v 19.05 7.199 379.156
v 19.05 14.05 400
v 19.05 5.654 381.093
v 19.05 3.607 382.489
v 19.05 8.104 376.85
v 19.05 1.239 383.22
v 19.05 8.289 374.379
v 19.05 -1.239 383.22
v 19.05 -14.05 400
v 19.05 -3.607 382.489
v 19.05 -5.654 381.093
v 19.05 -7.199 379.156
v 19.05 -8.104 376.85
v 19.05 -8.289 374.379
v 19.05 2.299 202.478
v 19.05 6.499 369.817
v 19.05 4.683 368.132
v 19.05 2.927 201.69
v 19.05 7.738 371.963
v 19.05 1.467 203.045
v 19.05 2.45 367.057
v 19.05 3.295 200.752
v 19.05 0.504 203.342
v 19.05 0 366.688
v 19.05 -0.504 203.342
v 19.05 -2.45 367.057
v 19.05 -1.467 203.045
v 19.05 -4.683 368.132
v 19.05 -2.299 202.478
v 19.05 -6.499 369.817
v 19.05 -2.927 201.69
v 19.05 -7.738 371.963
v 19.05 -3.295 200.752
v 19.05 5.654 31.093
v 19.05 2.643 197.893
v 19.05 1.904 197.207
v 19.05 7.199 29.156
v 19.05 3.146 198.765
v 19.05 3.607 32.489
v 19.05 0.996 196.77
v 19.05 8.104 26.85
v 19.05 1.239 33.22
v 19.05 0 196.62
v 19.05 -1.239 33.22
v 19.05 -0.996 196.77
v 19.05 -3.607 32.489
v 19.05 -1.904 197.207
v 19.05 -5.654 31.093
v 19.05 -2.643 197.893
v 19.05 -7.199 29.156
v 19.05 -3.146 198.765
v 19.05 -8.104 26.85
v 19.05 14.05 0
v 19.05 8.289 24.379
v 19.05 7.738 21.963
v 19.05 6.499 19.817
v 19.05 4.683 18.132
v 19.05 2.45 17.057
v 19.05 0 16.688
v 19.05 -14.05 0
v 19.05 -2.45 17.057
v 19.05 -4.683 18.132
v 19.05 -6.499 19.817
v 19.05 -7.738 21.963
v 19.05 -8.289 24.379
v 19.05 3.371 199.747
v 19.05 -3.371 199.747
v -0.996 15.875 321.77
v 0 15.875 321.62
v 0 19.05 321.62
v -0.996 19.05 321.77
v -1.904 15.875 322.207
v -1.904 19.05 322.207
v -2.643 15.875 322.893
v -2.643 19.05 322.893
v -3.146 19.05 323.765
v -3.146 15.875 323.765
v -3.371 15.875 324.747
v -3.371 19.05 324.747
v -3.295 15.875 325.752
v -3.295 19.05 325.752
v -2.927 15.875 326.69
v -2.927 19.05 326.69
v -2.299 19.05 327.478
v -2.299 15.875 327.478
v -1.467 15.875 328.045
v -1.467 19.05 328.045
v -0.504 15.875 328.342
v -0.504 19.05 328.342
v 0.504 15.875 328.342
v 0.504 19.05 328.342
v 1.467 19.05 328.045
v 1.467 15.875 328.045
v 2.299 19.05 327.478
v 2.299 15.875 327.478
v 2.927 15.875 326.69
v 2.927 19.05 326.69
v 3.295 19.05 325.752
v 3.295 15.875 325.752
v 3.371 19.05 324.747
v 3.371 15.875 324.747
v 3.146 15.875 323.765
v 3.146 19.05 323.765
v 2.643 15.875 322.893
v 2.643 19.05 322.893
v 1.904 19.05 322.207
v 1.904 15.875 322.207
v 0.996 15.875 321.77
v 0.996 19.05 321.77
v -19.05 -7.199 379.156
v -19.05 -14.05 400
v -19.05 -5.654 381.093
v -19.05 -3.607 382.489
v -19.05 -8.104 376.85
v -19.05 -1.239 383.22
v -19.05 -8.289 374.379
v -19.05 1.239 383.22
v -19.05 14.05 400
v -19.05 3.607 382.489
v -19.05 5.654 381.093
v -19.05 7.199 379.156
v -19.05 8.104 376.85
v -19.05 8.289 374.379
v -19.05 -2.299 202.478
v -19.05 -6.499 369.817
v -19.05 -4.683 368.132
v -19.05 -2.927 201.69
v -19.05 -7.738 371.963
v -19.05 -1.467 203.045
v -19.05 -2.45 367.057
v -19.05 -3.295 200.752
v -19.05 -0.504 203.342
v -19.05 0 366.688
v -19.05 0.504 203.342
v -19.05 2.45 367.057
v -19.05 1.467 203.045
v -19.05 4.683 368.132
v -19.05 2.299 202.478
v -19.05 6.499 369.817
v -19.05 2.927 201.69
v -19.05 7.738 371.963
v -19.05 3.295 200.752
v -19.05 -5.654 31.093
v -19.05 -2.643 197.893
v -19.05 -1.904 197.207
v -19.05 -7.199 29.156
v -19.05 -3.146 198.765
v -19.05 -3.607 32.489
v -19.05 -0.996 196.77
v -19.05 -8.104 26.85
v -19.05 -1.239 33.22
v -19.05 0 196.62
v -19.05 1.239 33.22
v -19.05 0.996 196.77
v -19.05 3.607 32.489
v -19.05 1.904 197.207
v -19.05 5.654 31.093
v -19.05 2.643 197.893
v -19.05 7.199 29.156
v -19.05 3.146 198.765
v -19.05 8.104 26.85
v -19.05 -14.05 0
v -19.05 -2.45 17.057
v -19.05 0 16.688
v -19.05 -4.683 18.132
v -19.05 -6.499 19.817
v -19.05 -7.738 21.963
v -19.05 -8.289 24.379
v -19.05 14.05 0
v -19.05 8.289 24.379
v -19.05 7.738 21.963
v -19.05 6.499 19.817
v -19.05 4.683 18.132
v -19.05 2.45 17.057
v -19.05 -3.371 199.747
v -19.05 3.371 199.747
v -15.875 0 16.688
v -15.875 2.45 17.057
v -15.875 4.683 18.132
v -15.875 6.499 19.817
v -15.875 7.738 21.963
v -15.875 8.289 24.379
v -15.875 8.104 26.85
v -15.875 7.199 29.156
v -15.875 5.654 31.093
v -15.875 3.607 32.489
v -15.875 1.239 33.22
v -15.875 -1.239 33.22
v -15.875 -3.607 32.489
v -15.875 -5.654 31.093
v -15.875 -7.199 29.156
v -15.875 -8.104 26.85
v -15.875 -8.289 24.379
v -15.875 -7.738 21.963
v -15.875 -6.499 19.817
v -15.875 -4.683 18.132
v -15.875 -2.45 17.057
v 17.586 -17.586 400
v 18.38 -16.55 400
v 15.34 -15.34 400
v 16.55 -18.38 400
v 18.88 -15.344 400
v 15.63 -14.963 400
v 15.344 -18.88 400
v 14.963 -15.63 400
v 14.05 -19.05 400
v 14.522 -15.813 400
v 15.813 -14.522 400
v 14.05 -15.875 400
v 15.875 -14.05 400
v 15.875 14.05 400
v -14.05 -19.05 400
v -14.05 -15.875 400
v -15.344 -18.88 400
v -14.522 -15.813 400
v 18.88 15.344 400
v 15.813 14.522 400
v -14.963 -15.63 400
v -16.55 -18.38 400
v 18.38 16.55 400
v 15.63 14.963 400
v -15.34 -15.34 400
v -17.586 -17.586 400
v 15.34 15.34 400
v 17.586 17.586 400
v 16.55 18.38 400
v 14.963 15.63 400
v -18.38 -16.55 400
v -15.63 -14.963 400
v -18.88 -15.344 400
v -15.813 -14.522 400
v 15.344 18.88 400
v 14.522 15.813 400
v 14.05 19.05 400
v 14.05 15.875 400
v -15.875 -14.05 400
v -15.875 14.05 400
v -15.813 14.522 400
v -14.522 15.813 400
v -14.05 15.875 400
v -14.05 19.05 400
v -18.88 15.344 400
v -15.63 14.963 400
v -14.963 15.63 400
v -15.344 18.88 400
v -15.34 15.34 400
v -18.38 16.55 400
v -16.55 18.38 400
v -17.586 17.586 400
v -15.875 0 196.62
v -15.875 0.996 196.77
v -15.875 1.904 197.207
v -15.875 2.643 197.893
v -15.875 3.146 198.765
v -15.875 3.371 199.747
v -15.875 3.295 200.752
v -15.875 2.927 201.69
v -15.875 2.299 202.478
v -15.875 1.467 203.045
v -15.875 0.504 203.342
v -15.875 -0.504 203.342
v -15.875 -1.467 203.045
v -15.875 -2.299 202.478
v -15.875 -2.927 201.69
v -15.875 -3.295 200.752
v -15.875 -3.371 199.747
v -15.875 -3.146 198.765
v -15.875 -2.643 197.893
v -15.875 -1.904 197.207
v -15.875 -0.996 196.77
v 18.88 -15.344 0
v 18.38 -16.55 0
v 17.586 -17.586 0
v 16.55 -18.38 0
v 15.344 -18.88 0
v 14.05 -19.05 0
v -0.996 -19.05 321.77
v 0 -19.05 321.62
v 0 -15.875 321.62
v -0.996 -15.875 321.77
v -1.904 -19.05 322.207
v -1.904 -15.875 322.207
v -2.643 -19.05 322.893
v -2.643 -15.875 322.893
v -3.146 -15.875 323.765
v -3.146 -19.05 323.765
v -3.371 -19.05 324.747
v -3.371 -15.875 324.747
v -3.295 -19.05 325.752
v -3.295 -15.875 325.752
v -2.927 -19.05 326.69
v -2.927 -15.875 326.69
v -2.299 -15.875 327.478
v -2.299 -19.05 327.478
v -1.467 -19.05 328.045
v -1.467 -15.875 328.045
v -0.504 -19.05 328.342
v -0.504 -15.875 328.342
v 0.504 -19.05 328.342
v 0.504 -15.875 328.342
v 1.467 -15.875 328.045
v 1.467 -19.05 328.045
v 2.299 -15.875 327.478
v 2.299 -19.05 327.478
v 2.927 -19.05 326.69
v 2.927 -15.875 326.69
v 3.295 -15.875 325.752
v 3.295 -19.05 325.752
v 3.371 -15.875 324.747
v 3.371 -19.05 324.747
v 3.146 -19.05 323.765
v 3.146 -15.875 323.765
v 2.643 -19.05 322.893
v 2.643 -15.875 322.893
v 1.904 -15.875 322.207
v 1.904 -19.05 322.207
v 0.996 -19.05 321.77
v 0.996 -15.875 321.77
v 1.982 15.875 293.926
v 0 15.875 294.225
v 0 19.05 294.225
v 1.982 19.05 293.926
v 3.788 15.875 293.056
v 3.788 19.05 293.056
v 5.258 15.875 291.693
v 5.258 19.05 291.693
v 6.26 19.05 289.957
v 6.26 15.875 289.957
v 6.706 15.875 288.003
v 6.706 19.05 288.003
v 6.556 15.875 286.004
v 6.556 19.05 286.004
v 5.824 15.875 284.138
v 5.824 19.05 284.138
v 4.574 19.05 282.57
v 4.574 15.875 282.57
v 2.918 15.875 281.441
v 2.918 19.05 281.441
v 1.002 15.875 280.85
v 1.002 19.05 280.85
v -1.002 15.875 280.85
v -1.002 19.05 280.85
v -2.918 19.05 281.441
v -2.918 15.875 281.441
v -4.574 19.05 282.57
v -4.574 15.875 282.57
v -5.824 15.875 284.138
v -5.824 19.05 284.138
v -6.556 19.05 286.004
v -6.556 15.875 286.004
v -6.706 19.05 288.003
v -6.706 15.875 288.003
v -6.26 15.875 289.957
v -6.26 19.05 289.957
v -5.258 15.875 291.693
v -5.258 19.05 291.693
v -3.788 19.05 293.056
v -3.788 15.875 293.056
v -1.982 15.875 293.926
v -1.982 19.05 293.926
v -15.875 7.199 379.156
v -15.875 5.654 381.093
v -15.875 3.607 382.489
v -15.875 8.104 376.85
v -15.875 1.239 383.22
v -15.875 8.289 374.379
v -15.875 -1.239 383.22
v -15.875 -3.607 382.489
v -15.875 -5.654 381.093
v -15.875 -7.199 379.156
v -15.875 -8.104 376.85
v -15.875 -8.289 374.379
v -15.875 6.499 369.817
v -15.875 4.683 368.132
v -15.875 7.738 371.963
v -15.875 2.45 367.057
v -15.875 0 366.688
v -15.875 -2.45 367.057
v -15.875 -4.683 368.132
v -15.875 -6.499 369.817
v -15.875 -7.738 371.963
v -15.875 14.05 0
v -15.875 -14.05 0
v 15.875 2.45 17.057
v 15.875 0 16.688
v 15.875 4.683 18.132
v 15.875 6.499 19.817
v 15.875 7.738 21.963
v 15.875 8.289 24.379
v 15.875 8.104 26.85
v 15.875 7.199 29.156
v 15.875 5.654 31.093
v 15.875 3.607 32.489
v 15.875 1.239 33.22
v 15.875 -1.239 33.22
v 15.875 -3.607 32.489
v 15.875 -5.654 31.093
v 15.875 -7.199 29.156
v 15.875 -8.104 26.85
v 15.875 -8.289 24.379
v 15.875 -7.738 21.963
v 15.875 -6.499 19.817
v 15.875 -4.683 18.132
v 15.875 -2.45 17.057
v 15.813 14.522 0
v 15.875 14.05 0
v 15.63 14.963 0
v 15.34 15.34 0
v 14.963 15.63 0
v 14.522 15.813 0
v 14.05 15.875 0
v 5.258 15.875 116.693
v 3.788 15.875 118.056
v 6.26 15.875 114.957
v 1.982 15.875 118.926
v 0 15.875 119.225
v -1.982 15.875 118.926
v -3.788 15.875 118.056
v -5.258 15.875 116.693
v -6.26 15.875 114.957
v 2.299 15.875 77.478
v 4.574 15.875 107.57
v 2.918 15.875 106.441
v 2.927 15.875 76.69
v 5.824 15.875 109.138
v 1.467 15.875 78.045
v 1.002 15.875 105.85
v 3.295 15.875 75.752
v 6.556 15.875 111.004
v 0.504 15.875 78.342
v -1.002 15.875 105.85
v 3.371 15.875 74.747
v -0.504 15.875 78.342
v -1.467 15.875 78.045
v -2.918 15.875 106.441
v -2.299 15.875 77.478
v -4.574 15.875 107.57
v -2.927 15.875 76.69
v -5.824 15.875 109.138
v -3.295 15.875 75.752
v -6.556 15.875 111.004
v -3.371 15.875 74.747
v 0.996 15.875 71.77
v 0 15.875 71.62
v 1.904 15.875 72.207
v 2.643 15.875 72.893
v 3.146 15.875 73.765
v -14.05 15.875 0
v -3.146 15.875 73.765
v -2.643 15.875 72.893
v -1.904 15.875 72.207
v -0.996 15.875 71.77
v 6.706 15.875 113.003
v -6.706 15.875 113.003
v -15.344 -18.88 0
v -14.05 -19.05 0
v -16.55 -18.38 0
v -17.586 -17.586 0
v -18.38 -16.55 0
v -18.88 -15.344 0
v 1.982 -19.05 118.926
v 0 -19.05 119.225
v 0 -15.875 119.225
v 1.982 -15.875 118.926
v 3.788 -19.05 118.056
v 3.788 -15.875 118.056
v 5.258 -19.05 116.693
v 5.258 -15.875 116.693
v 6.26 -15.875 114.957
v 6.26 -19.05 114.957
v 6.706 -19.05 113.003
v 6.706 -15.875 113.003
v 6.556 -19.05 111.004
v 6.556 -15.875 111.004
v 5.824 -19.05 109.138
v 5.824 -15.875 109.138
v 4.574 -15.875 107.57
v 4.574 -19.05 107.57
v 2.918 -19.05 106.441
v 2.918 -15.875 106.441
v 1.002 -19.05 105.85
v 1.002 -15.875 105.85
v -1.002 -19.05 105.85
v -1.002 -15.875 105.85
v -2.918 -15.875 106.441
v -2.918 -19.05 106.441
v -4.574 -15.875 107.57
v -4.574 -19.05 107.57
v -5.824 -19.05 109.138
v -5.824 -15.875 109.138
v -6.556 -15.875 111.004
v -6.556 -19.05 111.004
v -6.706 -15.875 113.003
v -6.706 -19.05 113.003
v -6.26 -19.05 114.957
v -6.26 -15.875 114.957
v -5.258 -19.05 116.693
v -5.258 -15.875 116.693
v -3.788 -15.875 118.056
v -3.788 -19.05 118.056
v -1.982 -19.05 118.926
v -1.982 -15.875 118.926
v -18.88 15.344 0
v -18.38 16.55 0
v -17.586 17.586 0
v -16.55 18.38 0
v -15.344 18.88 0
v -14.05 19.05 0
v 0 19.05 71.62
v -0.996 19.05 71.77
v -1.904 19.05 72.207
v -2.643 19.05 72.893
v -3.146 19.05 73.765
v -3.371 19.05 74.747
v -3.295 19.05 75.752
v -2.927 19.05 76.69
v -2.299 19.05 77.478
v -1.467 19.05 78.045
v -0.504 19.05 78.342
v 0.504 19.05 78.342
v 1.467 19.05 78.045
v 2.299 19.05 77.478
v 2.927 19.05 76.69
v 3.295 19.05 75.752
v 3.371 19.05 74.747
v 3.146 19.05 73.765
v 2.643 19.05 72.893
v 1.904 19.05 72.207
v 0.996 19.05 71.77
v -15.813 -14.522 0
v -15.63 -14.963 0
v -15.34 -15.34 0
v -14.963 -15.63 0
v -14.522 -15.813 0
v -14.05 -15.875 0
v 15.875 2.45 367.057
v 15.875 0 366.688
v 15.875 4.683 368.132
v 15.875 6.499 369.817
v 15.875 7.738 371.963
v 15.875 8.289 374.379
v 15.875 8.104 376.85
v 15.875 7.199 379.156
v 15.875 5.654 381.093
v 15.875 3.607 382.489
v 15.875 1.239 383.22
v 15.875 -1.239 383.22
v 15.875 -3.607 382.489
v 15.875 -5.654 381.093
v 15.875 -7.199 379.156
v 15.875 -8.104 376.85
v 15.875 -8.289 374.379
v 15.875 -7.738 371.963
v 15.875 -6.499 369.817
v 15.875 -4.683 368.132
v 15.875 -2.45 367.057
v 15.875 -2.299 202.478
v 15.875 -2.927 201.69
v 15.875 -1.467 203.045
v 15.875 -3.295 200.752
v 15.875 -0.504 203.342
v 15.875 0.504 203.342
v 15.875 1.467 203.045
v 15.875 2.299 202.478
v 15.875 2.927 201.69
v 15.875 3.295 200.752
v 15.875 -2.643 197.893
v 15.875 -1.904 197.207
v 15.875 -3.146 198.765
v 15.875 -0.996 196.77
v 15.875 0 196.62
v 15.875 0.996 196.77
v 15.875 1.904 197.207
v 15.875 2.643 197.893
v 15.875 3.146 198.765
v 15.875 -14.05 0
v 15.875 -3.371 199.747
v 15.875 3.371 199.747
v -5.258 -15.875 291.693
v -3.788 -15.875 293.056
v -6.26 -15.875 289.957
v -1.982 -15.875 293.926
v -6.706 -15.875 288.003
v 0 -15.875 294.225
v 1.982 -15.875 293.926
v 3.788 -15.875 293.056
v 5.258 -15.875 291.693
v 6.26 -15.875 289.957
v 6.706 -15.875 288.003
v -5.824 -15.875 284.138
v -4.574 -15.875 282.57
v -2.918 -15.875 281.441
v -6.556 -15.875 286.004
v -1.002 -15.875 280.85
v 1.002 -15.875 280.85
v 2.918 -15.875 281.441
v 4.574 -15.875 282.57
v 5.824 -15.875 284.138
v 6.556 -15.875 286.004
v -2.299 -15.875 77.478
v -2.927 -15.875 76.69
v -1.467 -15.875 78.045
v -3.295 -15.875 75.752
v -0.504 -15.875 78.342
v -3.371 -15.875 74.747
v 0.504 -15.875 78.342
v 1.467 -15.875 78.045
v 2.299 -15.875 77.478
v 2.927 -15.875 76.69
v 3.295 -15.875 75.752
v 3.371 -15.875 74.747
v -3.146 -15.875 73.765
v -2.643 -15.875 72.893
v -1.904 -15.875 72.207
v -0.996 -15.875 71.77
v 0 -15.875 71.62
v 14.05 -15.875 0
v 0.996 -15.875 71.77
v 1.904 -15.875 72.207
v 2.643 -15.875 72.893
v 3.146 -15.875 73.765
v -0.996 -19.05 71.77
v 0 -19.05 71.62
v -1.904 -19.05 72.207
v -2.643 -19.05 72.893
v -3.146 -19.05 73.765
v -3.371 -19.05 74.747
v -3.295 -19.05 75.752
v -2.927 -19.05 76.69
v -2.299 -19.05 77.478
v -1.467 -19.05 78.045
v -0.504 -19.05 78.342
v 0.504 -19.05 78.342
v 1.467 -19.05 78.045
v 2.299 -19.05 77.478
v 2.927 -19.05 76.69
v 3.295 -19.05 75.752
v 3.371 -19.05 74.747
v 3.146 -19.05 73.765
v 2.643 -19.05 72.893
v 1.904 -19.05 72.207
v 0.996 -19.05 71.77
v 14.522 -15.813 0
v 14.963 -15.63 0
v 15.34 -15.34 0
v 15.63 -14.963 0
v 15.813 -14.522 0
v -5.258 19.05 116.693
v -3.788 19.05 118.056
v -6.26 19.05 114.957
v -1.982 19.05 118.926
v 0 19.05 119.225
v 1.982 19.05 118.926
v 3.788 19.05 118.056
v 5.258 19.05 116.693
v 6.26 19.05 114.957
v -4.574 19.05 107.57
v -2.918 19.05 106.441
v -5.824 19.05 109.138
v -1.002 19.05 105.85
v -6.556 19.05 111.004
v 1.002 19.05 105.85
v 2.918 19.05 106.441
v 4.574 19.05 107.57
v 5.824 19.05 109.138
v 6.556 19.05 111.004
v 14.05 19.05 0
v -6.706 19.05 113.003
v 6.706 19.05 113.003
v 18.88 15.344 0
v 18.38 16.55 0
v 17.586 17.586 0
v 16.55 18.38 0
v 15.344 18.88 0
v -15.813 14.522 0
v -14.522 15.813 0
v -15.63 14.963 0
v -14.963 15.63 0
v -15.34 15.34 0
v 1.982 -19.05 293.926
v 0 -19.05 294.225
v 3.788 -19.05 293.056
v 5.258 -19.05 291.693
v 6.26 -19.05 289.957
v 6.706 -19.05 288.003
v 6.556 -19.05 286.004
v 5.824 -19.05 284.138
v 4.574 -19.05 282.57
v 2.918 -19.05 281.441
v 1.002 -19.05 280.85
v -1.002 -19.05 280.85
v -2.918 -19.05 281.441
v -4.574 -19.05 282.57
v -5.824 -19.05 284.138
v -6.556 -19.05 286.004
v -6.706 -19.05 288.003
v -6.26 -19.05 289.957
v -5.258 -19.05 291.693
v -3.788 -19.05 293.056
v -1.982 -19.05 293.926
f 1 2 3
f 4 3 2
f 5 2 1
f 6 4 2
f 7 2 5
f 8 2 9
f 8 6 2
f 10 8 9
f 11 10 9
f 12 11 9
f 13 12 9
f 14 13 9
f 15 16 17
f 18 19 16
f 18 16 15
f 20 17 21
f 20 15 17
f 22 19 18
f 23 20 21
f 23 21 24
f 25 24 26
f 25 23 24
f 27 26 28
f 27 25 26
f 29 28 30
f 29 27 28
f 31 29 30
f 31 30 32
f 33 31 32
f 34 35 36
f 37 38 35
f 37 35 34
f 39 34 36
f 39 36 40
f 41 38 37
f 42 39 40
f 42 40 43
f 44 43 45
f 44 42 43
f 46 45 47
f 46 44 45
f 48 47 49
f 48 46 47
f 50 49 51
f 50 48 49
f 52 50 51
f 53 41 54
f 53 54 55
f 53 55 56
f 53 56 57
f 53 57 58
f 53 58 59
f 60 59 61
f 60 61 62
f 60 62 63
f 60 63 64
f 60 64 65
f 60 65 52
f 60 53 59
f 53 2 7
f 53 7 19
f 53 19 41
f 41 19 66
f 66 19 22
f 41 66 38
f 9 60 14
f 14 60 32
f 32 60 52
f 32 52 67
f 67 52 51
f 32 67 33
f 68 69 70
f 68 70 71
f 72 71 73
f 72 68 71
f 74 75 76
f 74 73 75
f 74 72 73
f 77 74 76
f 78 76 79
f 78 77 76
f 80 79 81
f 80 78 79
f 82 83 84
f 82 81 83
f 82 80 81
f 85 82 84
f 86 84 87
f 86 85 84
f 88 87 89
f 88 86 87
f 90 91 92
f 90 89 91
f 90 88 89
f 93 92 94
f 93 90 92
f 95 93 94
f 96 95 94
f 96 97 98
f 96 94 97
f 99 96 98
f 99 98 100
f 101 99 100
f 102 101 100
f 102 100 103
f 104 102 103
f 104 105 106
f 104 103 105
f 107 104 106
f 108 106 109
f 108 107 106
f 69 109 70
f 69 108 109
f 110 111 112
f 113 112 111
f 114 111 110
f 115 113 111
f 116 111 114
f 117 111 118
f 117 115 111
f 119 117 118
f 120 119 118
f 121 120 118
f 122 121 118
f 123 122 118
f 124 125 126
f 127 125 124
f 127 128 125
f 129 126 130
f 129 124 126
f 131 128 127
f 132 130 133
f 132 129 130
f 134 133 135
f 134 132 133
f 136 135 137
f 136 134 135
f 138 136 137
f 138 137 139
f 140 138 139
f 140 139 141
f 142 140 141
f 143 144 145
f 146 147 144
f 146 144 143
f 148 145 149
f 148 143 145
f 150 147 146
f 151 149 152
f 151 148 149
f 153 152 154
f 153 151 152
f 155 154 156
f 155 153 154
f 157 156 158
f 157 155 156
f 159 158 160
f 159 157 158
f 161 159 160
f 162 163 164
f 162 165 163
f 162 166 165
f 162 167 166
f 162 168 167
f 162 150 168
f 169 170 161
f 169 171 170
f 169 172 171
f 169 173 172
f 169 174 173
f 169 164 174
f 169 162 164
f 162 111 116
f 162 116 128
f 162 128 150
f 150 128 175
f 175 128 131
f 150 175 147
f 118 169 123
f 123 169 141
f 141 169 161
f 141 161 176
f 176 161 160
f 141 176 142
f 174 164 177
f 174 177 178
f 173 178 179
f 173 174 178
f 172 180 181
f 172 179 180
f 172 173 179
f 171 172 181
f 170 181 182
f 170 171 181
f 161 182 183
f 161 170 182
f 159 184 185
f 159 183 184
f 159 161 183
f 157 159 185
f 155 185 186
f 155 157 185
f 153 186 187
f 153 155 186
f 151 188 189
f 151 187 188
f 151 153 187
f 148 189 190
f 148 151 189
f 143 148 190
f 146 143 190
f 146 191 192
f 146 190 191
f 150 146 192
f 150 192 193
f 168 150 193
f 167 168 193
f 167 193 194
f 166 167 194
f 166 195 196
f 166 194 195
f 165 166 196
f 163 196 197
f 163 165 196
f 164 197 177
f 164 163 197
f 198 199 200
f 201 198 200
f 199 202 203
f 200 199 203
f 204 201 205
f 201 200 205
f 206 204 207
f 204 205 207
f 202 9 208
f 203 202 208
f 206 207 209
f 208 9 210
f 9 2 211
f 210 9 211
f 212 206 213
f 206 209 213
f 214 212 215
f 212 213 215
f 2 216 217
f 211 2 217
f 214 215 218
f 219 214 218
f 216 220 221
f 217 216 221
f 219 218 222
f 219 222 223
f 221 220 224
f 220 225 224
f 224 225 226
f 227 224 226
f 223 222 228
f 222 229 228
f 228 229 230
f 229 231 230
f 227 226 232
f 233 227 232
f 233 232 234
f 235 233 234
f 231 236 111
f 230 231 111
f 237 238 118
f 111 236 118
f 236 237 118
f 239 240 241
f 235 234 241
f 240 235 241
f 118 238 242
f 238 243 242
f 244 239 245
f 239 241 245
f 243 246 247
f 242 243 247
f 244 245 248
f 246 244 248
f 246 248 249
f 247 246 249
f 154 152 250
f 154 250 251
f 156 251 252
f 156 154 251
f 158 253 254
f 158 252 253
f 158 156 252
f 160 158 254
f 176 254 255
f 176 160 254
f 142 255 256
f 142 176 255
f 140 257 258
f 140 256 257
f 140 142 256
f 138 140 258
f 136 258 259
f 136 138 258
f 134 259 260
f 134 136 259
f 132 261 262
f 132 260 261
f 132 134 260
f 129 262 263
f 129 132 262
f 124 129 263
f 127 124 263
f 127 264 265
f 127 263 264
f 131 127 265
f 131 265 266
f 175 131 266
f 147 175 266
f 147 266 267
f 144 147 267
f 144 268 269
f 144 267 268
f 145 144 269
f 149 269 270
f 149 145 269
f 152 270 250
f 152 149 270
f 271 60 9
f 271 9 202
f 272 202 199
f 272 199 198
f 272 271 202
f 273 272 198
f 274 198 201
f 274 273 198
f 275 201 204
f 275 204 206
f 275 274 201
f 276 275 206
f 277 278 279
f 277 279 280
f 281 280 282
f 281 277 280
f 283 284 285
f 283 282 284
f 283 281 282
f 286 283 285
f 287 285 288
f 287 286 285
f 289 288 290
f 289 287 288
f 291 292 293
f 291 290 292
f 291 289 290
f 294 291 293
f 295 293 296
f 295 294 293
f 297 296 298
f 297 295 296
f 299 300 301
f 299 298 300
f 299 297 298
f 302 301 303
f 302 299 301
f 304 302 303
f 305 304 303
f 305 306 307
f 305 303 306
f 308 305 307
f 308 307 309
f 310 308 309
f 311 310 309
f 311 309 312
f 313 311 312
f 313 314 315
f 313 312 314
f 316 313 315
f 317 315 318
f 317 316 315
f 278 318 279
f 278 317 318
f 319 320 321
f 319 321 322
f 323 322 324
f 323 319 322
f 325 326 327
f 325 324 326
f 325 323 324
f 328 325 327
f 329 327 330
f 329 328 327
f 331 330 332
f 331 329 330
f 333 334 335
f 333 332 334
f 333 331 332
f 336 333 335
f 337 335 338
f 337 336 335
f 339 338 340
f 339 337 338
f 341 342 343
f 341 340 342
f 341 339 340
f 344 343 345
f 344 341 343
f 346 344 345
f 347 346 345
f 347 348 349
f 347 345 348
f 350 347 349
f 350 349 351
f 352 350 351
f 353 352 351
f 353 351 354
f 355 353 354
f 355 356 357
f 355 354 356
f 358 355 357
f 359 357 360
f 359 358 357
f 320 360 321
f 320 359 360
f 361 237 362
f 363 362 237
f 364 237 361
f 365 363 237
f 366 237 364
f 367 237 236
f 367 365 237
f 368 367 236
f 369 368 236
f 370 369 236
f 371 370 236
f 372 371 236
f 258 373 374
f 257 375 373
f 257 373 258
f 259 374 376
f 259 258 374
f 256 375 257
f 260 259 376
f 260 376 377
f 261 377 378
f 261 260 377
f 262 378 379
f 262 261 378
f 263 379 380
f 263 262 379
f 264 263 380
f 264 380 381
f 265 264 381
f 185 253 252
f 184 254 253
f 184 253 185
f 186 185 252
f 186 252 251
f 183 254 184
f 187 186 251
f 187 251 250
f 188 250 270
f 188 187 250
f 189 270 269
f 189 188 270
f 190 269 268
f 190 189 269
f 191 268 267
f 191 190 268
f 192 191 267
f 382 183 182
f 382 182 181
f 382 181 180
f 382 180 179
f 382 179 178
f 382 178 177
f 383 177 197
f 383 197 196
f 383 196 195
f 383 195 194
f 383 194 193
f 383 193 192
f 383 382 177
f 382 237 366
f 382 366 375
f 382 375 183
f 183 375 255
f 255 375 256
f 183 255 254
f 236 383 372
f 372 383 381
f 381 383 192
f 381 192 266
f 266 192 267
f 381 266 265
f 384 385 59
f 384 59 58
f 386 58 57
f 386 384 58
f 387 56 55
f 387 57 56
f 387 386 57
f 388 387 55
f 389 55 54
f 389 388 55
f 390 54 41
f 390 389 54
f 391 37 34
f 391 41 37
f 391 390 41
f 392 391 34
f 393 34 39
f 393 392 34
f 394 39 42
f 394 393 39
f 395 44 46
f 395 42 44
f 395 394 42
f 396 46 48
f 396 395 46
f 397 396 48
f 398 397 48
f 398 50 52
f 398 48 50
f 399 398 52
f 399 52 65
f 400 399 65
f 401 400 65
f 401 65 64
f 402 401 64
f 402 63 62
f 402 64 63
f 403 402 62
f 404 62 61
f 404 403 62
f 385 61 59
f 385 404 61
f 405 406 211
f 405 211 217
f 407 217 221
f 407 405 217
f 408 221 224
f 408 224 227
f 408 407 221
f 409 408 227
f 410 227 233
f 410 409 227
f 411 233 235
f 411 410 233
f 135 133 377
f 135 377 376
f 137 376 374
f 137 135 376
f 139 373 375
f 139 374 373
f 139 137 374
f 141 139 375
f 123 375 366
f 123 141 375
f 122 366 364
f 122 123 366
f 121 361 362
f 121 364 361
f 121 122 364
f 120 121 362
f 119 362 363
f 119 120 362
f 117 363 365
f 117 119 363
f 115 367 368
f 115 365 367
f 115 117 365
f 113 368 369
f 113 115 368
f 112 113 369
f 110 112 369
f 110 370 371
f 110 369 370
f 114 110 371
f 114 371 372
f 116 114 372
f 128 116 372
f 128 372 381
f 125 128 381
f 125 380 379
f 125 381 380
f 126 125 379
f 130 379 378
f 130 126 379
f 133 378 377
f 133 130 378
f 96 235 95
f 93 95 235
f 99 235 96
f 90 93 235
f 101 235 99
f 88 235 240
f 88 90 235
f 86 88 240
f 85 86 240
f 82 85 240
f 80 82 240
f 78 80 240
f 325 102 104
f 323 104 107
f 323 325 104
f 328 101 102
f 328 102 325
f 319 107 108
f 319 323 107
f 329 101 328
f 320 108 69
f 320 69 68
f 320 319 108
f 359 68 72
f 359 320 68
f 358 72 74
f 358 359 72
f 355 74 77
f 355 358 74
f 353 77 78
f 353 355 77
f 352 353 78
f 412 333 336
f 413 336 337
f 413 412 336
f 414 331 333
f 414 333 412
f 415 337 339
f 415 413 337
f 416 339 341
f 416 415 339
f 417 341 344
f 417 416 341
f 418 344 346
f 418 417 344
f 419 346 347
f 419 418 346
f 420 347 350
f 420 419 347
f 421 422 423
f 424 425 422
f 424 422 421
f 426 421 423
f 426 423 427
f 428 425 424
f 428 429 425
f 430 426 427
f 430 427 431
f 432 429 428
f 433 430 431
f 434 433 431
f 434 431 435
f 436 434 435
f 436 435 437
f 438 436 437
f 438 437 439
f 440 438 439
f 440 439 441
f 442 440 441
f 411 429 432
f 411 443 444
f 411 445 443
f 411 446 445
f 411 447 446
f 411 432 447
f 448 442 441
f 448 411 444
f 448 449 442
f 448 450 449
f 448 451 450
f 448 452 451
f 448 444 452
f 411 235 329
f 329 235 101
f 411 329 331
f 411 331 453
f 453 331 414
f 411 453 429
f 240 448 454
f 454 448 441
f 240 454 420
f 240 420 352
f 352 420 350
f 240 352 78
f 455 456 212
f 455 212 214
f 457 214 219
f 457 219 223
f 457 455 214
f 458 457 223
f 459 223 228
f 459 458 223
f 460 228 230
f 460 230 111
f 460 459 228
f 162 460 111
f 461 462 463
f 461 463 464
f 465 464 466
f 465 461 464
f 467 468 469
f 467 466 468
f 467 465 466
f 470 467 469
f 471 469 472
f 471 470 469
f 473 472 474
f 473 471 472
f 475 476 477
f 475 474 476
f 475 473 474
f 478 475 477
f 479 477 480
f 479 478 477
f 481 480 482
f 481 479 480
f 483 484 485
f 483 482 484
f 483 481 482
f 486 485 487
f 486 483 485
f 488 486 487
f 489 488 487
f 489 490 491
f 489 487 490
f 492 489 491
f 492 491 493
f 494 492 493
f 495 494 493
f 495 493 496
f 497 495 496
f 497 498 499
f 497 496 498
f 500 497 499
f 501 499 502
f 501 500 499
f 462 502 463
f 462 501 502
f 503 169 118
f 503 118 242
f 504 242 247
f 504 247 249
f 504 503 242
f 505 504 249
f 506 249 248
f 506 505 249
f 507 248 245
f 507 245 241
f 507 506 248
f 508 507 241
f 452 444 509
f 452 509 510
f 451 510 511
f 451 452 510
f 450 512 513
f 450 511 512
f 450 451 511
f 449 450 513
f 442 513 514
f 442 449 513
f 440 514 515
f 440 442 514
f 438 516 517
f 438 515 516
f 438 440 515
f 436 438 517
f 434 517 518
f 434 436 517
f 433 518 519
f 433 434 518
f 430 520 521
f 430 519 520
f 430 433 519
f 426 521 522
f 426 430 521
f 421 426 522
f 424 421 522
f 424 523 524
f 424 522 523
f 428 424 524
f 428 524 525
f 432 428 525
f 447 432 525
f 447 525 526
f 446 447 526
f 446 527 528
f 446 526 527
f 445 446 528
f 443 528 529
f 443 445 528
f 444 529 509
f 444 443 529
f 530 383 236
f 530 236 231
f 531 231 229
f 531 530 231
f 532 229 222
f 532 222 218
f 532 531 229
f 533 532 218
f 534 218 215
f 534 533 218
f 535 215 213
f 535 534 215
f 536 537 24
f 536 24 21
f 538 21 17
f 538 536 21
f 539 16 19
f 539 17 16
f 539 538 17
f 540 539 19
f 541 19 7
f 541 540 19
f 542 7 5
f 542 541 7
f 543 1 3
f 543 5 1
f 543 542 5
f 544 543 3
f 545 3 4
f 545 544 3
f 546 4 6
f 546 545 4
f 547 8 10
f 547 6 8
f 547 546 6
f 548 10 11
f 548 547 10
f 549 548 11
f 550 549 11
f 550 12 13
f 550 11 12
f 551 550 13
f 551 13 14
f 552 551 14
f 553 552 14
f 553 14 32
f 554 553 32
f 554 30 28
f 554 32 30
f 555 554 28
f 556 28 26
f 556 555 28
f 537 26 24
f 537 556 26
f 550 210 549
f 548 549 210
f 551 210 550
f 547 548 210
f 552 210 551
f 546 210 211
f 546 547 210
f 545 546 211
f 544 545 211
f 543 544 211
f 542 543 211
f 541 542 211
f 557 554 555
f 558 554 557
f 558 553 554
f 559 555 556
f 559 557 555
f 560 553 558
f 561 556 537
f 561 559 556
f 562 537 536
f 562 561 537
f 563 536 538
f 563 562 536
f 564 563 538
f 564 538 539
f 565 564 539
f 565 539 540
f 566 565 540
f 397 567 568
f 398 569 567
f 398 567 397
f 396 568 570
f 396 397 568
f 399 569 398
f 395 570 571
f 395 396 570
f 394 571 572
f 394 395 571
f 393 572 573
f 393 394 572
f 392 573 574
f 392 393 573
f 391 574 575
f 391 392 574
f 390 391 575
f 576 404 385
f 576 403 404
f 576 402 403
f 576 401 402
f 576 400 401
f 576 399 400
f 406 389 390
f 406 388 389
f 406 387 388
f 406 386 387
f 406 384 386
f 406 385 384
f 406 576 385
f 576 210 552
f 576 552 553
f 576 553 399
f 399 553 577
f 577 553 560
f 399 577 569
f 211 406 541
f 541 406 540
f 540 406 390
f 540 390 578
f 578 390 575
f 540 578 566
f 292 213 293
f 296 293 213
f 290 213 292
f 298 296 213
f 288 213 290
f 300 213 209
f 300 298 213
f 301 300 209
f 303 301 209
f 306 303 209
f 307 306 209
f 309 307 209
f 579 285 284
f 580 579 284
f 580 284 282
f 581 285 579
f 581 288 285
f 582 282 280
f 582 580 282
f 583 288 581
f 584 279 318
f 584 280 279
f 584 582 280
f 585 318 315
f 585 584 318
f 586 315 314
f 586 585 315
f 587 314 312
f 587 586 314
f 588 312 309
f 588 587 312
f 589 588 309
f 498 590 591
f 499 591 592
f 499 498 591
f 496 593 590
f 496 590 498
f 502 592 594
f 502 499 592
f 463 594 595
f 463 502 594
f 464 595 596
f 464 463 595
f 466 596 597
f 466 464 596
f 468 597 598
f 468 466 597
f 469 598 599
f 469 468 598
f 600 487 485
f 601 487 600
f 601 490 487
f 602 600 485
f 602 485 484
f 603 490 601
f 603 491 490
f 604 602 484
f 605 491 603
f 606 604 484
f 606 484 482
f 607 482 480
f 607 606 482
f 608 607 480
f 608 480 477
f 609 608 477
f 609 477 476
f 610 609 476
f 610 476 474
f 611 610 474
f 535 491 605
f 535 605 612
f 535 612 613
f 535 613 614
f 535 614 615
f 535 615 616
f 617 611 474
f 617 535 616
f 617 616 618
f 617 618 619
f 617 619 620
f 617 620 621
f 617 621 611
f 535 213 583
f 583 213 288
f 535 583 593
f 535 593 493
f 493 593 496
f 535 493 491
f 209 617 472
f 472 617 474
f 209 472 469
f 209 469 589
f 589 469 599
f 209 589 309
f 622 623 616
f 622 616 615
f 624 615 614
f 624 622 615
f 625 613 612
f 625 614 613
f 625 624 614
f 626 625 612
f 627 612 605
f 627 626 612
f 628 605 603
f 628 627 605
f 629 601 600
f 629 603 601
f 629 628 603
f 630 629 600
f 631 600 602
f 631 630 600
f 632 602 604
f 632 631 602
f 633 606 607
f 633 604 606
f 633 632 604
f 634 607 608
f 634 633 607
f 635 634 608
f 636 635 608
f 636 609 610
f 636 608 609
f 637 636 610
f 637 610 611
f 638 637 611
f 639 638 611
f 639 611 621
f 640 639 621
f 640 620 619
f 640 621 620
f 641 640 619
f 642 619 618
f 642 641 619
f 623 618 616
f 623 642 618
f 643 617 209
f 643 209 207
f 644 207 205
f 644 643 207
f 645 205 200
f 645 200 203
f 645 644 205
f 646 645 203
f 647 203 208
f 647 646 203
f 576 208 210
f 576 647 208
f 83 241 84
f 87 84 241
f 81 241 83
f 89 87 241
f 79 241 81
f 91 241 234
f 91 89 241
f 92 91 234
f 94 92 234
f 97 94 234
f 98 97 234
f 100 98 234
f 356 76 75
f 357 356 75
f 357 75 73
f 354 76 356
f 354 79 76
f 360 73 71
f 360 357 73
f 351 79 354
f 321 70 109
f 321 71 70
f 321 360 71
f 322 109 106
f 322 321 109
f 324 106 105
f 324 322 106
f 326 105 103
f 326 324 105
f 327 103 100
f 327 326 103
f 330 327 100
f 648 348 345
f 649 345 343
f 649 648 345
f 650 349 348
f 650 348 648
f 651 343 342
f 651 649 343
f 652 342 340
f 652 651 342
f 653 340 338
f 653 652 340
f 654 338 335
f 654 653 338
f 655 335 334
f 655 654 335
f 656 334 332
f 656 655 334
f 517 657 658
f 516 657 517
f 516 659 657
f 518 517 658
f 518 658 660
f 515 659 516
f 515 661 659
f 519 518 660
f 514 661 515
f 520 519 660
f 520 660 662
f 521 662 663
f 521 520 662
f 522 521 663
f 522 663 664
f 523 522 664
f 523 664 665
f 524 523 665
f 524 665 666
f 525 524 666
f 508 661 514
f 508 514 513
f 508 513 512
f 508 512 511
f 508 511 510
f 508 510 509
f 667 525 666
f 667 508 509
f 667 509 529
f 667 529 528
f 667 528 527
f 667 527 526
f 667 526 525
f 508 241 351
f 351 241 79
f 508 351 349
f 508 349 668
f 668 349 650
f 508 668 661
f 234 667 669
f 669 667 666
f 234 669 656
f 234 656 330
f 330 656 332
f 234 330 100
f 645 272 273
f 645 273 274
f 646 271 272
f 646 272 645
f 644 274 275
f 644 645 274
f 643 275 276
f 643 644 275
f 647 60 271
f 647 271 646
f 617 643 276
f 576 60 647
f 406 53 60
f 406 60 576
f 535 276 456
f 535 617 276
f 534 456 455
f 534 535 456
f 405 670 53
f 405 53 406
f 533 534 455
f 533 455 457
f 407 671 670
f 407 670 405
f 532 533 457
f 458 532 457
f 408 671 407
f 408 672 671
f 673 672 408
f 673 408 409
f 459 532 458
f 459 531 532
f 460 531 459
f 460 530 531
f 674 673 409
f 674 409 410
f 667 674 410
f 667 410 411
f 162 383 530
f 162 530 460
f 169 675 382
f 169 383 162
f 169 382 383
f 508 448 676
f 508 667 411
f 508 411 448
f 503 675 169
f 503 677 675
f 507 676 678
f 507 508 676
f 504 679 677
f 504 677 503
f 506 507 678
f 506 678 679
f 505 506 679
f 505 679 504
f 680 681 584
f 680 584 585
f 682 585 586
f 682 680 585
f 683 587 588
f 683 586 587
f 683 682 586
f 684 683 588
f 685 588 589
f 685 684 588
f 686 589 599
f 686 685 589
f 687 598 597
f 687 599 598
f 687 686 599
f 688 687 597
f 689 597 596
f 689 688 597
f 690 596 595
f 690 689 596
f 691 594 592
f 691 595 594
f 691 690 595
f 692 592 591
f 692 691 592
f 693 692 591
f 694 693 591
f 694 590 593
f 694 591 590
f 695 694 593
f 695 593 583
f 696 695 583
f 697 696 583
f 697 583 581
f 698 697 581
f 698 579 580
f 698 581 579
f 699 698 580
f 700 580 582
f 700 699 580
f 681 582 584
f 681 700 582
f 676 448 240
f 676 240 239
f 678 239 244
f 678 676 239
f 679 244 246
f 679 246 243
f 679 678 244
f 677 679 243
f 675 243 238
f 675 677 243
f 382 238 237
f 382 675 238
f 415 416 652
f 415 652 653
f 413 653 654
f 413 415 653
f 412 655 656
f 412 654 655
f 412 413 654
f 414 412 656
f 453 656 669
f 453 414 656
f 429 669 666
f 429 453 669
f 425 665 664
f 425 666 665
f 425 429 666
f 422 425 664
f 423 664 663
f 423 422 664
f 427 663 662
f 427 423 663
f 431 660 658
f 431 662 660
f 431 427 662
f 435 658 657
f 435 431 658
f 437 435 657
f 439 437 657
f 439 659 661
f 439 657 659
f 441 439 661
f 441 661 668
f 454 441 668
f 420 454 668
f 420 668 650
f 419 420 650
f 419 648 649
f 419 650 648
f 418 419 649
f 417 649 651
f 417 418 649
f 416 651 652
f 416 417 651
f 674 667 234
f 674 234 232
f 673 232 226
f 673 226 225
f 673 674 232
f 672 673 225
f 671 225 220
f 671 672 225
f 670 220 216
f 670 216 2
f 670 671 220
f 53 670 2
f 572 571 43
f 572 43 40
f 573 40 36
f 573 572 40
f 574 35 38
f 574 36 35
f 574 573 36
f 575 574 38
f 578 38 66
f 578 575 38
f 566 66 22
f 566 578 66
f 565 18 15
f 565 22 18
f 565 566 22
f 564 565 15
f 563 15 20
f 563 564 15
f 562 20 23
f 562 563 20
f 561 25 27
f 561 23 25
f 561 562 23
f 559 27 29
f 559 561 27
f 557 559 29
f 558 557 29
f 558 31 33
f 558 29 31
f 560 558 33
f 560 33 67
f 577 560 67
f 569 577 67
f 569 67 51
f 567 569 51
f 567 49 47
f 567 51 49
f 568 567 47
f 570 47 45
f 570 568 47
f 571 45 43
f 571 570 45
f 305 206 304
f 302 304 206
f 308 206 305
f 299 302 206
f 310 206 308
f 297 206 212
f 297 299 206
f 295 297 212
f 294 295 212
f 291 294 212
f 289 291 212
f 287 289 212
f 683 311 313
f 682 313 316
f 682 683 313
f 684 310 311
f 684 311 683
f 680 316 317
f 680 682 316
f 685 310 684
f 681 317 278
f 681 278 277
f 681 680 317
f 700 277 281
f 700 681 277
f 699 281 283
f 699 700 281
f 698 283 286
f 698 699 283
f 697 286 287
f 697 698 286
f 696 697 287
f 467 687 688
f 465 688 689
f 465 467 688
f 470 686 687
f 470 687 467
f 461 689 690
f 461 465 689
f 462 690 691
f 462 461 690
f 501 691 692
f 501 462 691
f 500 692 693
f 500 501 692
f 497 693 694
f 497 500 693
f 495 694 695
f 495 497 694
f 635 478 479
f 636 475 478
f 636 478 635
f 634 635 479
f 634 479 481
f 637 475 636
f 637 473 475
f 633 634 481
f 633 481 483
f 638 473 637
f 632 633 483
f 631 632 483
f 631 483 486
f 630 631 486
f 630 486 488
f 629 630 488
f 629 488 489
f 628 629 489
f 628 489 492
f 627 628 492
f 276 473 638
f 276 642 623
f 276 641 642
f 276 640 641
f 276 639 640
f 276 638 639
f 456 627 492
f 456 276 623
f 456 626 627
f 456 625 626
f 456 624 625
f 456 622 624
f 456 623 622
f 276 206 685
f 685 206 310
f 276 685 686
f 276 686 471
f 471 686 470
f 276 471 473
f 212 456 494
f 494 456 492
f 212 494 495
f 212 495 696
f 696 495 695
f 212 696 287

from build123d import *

# Parameters (mm, degrees)
BOSS_EXTRUDE1_DEPTH             = 400
CUT_EXTRUDE1_DEPTH              = 401.906229685
CUT_EXTRUDE1_DEPTH_BACK         = 401.906229685
SKETCH2_R                       = 8.3125
CUT_EXTRUDE2_DEPTH              = 401.906229685
CUT_EXTRUDE2_DEPTH_BACK         = 401.906229685
SKETCH3_R                       = 3.38
CUT_EXTRUDE3_DEPTH              = 401.906229685
CUT_EXTRUDE3_DEPTH_BACK         = 401.906229685
SKETCH4_R                       = 3.38
BROOM_MOUNTING_HOLES_DEPTH      = 401.906229685
BROOM_MOUNTING_HOLES_DEPTH_BACK = 401.906229685
SKETCH6_R                       = 6.725


with BuildPart() as part:
    # Sketch1 → Boss-Extrude1 (new body)
    with BuildSketch(Plane.XY):
        with BuildLine():
            Line((-14.05, 19.05), (14.05, 19.05))
            ThreePointArc((14.05, 19.05), (17.585533906, 17.585533906), (19.05, 14.05))
            Line((19.05, 14.05), (19.05, -14.05))
            ThreePointArc((19.05, -14.05), (17.585533906, -17.585533906), (14.05, -19.05))
            Line((14.05, -19.05), (-14.05, -19.05))
            ThreePointArc((-14.05, -19.05), (-17.585533906, -17.585533906), (-19.05, -14.05))
            Line((-19.05, -14.05), (-19.05, 14.05))
            ThreePointArc((-19.05, 14.05), (-17.585533906, 17.585533906), (-14.05, 19.05))
        make_face()
        with BuildLine():
            Line((-15.875, 14.05), (-15.875, -14.05))
            ThreePointArc((-15.875, -14.05), (-15.340469876, -15.340469876), (-14.05, -15.875))
            Line((-14.05, -15.875), (14.05, -15.875))
            ThreePointArc((14.05, -15.875), (15.340469876, -15.340469876), (15.875, -14.05))
            Line((15.875, -14.05), (15.875, 14.05))
            ThreePointArc((15.875, 14.05), (15.340469876, 15.340469876), (14.05, 15.875))
            Line((14.05, 15.875), (-14.05, 15.875))
            ThreePointArc((-14.05, 15.875), (-15.340469876, 15.340469876), (-15.875, 14.05))
        make_face(mode=Mode.SUBTRACT)
    extrude(amount=BOSS_EXTRUDE1_DEPTH)

    # Sketch2 → Cut-Extrude1 (cut, two sides: drawn at the far end of the back side and taken through both)
    with BuildSketch(Plane(origin=(0, 0, 0), x_dir=(0, 0, -1), z_dir=(1, 0, 0)).offset(-CUT_EXTRUDE1_DEPTH_BACK)):
        with Locations((-375, 0)):
            Circle(SKETCH2_R)
        with Locations((-25, 0)):
            Circle(SKETCH2_R)
    extrude(amount=CUT_EXTRUDE1_DEPTH + CUT_EXTRUDE1_DEPTH_BACK, mode=Mode.SUBTRACT)

    # Sketch3 → Cut-Extrude2 (cut, two sides: drawn at the far end of the back side and taken through both)
    with BuildSketch(Plane(origin=(0, 0, 0), x_dir=(1, 0, 0), z_dir=(0, 1, 0)).offset(-CUT_EXTRUDE2_DEPTH_BACK)):
        with Locations(Location((0, -325, 0), (0, 0, 90))):
            Circle(SKETCH3_R)
        with Locations(Location((0, -75, 0), (0, 0, 90))):
            Circle(SKETCH3_R)
    extrude(amount=CUT_EXTRUDE2_DEPTH + CUT_EXTRUDE2_DEPTH_BACK, mode=Mode.SUBTRACT)

    # Sketch4 → Cut-Extrude3 (cut, two sides: drawn at the far end of the back side and taken through both)
    with BuildSketch(Plane(origin=(0, 0, 0), x_dir=(0, 0, -1), z_dir=(1, 0, 0)).offset(-CUT_EXTRUDE3_DEPTH_BACK)):
        with Locations((-200, 0)):
            Circle(SKETCH4_R)
    extrude(amount=CUT_EXTRUDE3_DEPTH + CUT_EXTRUDE3_DEPTH_BACK, mode=Mode.SUBTRACT)

    # Sketch6 → Broom Mounting Holes (cut, two sides: drawn at the far end of the back side and taken through both)
    with BuildSketch(Plane(origin=(0, 0, 0), x_dir=(1, 0, 0), z_dir=(0, 1, 0)).offset(-BROOM_MOUNTING_HOLES_DEPTH_BACK)):
        with Locations(Location((0, -112.5, 0), (0, 0, 270))):
            Circle(SKETCH6_R)
        with Locations(Location((0, -287.5, 0), (0, 0, 270))):
            Circle(SKETCH6_R)
    extrude(amount=BROOM_MOUNTING_HOLES_DEPTH + BROOM_MOUNTING_HOLES_DEPTH_BACK, mode=Mode.SUBTRACT)


solid = part.part
